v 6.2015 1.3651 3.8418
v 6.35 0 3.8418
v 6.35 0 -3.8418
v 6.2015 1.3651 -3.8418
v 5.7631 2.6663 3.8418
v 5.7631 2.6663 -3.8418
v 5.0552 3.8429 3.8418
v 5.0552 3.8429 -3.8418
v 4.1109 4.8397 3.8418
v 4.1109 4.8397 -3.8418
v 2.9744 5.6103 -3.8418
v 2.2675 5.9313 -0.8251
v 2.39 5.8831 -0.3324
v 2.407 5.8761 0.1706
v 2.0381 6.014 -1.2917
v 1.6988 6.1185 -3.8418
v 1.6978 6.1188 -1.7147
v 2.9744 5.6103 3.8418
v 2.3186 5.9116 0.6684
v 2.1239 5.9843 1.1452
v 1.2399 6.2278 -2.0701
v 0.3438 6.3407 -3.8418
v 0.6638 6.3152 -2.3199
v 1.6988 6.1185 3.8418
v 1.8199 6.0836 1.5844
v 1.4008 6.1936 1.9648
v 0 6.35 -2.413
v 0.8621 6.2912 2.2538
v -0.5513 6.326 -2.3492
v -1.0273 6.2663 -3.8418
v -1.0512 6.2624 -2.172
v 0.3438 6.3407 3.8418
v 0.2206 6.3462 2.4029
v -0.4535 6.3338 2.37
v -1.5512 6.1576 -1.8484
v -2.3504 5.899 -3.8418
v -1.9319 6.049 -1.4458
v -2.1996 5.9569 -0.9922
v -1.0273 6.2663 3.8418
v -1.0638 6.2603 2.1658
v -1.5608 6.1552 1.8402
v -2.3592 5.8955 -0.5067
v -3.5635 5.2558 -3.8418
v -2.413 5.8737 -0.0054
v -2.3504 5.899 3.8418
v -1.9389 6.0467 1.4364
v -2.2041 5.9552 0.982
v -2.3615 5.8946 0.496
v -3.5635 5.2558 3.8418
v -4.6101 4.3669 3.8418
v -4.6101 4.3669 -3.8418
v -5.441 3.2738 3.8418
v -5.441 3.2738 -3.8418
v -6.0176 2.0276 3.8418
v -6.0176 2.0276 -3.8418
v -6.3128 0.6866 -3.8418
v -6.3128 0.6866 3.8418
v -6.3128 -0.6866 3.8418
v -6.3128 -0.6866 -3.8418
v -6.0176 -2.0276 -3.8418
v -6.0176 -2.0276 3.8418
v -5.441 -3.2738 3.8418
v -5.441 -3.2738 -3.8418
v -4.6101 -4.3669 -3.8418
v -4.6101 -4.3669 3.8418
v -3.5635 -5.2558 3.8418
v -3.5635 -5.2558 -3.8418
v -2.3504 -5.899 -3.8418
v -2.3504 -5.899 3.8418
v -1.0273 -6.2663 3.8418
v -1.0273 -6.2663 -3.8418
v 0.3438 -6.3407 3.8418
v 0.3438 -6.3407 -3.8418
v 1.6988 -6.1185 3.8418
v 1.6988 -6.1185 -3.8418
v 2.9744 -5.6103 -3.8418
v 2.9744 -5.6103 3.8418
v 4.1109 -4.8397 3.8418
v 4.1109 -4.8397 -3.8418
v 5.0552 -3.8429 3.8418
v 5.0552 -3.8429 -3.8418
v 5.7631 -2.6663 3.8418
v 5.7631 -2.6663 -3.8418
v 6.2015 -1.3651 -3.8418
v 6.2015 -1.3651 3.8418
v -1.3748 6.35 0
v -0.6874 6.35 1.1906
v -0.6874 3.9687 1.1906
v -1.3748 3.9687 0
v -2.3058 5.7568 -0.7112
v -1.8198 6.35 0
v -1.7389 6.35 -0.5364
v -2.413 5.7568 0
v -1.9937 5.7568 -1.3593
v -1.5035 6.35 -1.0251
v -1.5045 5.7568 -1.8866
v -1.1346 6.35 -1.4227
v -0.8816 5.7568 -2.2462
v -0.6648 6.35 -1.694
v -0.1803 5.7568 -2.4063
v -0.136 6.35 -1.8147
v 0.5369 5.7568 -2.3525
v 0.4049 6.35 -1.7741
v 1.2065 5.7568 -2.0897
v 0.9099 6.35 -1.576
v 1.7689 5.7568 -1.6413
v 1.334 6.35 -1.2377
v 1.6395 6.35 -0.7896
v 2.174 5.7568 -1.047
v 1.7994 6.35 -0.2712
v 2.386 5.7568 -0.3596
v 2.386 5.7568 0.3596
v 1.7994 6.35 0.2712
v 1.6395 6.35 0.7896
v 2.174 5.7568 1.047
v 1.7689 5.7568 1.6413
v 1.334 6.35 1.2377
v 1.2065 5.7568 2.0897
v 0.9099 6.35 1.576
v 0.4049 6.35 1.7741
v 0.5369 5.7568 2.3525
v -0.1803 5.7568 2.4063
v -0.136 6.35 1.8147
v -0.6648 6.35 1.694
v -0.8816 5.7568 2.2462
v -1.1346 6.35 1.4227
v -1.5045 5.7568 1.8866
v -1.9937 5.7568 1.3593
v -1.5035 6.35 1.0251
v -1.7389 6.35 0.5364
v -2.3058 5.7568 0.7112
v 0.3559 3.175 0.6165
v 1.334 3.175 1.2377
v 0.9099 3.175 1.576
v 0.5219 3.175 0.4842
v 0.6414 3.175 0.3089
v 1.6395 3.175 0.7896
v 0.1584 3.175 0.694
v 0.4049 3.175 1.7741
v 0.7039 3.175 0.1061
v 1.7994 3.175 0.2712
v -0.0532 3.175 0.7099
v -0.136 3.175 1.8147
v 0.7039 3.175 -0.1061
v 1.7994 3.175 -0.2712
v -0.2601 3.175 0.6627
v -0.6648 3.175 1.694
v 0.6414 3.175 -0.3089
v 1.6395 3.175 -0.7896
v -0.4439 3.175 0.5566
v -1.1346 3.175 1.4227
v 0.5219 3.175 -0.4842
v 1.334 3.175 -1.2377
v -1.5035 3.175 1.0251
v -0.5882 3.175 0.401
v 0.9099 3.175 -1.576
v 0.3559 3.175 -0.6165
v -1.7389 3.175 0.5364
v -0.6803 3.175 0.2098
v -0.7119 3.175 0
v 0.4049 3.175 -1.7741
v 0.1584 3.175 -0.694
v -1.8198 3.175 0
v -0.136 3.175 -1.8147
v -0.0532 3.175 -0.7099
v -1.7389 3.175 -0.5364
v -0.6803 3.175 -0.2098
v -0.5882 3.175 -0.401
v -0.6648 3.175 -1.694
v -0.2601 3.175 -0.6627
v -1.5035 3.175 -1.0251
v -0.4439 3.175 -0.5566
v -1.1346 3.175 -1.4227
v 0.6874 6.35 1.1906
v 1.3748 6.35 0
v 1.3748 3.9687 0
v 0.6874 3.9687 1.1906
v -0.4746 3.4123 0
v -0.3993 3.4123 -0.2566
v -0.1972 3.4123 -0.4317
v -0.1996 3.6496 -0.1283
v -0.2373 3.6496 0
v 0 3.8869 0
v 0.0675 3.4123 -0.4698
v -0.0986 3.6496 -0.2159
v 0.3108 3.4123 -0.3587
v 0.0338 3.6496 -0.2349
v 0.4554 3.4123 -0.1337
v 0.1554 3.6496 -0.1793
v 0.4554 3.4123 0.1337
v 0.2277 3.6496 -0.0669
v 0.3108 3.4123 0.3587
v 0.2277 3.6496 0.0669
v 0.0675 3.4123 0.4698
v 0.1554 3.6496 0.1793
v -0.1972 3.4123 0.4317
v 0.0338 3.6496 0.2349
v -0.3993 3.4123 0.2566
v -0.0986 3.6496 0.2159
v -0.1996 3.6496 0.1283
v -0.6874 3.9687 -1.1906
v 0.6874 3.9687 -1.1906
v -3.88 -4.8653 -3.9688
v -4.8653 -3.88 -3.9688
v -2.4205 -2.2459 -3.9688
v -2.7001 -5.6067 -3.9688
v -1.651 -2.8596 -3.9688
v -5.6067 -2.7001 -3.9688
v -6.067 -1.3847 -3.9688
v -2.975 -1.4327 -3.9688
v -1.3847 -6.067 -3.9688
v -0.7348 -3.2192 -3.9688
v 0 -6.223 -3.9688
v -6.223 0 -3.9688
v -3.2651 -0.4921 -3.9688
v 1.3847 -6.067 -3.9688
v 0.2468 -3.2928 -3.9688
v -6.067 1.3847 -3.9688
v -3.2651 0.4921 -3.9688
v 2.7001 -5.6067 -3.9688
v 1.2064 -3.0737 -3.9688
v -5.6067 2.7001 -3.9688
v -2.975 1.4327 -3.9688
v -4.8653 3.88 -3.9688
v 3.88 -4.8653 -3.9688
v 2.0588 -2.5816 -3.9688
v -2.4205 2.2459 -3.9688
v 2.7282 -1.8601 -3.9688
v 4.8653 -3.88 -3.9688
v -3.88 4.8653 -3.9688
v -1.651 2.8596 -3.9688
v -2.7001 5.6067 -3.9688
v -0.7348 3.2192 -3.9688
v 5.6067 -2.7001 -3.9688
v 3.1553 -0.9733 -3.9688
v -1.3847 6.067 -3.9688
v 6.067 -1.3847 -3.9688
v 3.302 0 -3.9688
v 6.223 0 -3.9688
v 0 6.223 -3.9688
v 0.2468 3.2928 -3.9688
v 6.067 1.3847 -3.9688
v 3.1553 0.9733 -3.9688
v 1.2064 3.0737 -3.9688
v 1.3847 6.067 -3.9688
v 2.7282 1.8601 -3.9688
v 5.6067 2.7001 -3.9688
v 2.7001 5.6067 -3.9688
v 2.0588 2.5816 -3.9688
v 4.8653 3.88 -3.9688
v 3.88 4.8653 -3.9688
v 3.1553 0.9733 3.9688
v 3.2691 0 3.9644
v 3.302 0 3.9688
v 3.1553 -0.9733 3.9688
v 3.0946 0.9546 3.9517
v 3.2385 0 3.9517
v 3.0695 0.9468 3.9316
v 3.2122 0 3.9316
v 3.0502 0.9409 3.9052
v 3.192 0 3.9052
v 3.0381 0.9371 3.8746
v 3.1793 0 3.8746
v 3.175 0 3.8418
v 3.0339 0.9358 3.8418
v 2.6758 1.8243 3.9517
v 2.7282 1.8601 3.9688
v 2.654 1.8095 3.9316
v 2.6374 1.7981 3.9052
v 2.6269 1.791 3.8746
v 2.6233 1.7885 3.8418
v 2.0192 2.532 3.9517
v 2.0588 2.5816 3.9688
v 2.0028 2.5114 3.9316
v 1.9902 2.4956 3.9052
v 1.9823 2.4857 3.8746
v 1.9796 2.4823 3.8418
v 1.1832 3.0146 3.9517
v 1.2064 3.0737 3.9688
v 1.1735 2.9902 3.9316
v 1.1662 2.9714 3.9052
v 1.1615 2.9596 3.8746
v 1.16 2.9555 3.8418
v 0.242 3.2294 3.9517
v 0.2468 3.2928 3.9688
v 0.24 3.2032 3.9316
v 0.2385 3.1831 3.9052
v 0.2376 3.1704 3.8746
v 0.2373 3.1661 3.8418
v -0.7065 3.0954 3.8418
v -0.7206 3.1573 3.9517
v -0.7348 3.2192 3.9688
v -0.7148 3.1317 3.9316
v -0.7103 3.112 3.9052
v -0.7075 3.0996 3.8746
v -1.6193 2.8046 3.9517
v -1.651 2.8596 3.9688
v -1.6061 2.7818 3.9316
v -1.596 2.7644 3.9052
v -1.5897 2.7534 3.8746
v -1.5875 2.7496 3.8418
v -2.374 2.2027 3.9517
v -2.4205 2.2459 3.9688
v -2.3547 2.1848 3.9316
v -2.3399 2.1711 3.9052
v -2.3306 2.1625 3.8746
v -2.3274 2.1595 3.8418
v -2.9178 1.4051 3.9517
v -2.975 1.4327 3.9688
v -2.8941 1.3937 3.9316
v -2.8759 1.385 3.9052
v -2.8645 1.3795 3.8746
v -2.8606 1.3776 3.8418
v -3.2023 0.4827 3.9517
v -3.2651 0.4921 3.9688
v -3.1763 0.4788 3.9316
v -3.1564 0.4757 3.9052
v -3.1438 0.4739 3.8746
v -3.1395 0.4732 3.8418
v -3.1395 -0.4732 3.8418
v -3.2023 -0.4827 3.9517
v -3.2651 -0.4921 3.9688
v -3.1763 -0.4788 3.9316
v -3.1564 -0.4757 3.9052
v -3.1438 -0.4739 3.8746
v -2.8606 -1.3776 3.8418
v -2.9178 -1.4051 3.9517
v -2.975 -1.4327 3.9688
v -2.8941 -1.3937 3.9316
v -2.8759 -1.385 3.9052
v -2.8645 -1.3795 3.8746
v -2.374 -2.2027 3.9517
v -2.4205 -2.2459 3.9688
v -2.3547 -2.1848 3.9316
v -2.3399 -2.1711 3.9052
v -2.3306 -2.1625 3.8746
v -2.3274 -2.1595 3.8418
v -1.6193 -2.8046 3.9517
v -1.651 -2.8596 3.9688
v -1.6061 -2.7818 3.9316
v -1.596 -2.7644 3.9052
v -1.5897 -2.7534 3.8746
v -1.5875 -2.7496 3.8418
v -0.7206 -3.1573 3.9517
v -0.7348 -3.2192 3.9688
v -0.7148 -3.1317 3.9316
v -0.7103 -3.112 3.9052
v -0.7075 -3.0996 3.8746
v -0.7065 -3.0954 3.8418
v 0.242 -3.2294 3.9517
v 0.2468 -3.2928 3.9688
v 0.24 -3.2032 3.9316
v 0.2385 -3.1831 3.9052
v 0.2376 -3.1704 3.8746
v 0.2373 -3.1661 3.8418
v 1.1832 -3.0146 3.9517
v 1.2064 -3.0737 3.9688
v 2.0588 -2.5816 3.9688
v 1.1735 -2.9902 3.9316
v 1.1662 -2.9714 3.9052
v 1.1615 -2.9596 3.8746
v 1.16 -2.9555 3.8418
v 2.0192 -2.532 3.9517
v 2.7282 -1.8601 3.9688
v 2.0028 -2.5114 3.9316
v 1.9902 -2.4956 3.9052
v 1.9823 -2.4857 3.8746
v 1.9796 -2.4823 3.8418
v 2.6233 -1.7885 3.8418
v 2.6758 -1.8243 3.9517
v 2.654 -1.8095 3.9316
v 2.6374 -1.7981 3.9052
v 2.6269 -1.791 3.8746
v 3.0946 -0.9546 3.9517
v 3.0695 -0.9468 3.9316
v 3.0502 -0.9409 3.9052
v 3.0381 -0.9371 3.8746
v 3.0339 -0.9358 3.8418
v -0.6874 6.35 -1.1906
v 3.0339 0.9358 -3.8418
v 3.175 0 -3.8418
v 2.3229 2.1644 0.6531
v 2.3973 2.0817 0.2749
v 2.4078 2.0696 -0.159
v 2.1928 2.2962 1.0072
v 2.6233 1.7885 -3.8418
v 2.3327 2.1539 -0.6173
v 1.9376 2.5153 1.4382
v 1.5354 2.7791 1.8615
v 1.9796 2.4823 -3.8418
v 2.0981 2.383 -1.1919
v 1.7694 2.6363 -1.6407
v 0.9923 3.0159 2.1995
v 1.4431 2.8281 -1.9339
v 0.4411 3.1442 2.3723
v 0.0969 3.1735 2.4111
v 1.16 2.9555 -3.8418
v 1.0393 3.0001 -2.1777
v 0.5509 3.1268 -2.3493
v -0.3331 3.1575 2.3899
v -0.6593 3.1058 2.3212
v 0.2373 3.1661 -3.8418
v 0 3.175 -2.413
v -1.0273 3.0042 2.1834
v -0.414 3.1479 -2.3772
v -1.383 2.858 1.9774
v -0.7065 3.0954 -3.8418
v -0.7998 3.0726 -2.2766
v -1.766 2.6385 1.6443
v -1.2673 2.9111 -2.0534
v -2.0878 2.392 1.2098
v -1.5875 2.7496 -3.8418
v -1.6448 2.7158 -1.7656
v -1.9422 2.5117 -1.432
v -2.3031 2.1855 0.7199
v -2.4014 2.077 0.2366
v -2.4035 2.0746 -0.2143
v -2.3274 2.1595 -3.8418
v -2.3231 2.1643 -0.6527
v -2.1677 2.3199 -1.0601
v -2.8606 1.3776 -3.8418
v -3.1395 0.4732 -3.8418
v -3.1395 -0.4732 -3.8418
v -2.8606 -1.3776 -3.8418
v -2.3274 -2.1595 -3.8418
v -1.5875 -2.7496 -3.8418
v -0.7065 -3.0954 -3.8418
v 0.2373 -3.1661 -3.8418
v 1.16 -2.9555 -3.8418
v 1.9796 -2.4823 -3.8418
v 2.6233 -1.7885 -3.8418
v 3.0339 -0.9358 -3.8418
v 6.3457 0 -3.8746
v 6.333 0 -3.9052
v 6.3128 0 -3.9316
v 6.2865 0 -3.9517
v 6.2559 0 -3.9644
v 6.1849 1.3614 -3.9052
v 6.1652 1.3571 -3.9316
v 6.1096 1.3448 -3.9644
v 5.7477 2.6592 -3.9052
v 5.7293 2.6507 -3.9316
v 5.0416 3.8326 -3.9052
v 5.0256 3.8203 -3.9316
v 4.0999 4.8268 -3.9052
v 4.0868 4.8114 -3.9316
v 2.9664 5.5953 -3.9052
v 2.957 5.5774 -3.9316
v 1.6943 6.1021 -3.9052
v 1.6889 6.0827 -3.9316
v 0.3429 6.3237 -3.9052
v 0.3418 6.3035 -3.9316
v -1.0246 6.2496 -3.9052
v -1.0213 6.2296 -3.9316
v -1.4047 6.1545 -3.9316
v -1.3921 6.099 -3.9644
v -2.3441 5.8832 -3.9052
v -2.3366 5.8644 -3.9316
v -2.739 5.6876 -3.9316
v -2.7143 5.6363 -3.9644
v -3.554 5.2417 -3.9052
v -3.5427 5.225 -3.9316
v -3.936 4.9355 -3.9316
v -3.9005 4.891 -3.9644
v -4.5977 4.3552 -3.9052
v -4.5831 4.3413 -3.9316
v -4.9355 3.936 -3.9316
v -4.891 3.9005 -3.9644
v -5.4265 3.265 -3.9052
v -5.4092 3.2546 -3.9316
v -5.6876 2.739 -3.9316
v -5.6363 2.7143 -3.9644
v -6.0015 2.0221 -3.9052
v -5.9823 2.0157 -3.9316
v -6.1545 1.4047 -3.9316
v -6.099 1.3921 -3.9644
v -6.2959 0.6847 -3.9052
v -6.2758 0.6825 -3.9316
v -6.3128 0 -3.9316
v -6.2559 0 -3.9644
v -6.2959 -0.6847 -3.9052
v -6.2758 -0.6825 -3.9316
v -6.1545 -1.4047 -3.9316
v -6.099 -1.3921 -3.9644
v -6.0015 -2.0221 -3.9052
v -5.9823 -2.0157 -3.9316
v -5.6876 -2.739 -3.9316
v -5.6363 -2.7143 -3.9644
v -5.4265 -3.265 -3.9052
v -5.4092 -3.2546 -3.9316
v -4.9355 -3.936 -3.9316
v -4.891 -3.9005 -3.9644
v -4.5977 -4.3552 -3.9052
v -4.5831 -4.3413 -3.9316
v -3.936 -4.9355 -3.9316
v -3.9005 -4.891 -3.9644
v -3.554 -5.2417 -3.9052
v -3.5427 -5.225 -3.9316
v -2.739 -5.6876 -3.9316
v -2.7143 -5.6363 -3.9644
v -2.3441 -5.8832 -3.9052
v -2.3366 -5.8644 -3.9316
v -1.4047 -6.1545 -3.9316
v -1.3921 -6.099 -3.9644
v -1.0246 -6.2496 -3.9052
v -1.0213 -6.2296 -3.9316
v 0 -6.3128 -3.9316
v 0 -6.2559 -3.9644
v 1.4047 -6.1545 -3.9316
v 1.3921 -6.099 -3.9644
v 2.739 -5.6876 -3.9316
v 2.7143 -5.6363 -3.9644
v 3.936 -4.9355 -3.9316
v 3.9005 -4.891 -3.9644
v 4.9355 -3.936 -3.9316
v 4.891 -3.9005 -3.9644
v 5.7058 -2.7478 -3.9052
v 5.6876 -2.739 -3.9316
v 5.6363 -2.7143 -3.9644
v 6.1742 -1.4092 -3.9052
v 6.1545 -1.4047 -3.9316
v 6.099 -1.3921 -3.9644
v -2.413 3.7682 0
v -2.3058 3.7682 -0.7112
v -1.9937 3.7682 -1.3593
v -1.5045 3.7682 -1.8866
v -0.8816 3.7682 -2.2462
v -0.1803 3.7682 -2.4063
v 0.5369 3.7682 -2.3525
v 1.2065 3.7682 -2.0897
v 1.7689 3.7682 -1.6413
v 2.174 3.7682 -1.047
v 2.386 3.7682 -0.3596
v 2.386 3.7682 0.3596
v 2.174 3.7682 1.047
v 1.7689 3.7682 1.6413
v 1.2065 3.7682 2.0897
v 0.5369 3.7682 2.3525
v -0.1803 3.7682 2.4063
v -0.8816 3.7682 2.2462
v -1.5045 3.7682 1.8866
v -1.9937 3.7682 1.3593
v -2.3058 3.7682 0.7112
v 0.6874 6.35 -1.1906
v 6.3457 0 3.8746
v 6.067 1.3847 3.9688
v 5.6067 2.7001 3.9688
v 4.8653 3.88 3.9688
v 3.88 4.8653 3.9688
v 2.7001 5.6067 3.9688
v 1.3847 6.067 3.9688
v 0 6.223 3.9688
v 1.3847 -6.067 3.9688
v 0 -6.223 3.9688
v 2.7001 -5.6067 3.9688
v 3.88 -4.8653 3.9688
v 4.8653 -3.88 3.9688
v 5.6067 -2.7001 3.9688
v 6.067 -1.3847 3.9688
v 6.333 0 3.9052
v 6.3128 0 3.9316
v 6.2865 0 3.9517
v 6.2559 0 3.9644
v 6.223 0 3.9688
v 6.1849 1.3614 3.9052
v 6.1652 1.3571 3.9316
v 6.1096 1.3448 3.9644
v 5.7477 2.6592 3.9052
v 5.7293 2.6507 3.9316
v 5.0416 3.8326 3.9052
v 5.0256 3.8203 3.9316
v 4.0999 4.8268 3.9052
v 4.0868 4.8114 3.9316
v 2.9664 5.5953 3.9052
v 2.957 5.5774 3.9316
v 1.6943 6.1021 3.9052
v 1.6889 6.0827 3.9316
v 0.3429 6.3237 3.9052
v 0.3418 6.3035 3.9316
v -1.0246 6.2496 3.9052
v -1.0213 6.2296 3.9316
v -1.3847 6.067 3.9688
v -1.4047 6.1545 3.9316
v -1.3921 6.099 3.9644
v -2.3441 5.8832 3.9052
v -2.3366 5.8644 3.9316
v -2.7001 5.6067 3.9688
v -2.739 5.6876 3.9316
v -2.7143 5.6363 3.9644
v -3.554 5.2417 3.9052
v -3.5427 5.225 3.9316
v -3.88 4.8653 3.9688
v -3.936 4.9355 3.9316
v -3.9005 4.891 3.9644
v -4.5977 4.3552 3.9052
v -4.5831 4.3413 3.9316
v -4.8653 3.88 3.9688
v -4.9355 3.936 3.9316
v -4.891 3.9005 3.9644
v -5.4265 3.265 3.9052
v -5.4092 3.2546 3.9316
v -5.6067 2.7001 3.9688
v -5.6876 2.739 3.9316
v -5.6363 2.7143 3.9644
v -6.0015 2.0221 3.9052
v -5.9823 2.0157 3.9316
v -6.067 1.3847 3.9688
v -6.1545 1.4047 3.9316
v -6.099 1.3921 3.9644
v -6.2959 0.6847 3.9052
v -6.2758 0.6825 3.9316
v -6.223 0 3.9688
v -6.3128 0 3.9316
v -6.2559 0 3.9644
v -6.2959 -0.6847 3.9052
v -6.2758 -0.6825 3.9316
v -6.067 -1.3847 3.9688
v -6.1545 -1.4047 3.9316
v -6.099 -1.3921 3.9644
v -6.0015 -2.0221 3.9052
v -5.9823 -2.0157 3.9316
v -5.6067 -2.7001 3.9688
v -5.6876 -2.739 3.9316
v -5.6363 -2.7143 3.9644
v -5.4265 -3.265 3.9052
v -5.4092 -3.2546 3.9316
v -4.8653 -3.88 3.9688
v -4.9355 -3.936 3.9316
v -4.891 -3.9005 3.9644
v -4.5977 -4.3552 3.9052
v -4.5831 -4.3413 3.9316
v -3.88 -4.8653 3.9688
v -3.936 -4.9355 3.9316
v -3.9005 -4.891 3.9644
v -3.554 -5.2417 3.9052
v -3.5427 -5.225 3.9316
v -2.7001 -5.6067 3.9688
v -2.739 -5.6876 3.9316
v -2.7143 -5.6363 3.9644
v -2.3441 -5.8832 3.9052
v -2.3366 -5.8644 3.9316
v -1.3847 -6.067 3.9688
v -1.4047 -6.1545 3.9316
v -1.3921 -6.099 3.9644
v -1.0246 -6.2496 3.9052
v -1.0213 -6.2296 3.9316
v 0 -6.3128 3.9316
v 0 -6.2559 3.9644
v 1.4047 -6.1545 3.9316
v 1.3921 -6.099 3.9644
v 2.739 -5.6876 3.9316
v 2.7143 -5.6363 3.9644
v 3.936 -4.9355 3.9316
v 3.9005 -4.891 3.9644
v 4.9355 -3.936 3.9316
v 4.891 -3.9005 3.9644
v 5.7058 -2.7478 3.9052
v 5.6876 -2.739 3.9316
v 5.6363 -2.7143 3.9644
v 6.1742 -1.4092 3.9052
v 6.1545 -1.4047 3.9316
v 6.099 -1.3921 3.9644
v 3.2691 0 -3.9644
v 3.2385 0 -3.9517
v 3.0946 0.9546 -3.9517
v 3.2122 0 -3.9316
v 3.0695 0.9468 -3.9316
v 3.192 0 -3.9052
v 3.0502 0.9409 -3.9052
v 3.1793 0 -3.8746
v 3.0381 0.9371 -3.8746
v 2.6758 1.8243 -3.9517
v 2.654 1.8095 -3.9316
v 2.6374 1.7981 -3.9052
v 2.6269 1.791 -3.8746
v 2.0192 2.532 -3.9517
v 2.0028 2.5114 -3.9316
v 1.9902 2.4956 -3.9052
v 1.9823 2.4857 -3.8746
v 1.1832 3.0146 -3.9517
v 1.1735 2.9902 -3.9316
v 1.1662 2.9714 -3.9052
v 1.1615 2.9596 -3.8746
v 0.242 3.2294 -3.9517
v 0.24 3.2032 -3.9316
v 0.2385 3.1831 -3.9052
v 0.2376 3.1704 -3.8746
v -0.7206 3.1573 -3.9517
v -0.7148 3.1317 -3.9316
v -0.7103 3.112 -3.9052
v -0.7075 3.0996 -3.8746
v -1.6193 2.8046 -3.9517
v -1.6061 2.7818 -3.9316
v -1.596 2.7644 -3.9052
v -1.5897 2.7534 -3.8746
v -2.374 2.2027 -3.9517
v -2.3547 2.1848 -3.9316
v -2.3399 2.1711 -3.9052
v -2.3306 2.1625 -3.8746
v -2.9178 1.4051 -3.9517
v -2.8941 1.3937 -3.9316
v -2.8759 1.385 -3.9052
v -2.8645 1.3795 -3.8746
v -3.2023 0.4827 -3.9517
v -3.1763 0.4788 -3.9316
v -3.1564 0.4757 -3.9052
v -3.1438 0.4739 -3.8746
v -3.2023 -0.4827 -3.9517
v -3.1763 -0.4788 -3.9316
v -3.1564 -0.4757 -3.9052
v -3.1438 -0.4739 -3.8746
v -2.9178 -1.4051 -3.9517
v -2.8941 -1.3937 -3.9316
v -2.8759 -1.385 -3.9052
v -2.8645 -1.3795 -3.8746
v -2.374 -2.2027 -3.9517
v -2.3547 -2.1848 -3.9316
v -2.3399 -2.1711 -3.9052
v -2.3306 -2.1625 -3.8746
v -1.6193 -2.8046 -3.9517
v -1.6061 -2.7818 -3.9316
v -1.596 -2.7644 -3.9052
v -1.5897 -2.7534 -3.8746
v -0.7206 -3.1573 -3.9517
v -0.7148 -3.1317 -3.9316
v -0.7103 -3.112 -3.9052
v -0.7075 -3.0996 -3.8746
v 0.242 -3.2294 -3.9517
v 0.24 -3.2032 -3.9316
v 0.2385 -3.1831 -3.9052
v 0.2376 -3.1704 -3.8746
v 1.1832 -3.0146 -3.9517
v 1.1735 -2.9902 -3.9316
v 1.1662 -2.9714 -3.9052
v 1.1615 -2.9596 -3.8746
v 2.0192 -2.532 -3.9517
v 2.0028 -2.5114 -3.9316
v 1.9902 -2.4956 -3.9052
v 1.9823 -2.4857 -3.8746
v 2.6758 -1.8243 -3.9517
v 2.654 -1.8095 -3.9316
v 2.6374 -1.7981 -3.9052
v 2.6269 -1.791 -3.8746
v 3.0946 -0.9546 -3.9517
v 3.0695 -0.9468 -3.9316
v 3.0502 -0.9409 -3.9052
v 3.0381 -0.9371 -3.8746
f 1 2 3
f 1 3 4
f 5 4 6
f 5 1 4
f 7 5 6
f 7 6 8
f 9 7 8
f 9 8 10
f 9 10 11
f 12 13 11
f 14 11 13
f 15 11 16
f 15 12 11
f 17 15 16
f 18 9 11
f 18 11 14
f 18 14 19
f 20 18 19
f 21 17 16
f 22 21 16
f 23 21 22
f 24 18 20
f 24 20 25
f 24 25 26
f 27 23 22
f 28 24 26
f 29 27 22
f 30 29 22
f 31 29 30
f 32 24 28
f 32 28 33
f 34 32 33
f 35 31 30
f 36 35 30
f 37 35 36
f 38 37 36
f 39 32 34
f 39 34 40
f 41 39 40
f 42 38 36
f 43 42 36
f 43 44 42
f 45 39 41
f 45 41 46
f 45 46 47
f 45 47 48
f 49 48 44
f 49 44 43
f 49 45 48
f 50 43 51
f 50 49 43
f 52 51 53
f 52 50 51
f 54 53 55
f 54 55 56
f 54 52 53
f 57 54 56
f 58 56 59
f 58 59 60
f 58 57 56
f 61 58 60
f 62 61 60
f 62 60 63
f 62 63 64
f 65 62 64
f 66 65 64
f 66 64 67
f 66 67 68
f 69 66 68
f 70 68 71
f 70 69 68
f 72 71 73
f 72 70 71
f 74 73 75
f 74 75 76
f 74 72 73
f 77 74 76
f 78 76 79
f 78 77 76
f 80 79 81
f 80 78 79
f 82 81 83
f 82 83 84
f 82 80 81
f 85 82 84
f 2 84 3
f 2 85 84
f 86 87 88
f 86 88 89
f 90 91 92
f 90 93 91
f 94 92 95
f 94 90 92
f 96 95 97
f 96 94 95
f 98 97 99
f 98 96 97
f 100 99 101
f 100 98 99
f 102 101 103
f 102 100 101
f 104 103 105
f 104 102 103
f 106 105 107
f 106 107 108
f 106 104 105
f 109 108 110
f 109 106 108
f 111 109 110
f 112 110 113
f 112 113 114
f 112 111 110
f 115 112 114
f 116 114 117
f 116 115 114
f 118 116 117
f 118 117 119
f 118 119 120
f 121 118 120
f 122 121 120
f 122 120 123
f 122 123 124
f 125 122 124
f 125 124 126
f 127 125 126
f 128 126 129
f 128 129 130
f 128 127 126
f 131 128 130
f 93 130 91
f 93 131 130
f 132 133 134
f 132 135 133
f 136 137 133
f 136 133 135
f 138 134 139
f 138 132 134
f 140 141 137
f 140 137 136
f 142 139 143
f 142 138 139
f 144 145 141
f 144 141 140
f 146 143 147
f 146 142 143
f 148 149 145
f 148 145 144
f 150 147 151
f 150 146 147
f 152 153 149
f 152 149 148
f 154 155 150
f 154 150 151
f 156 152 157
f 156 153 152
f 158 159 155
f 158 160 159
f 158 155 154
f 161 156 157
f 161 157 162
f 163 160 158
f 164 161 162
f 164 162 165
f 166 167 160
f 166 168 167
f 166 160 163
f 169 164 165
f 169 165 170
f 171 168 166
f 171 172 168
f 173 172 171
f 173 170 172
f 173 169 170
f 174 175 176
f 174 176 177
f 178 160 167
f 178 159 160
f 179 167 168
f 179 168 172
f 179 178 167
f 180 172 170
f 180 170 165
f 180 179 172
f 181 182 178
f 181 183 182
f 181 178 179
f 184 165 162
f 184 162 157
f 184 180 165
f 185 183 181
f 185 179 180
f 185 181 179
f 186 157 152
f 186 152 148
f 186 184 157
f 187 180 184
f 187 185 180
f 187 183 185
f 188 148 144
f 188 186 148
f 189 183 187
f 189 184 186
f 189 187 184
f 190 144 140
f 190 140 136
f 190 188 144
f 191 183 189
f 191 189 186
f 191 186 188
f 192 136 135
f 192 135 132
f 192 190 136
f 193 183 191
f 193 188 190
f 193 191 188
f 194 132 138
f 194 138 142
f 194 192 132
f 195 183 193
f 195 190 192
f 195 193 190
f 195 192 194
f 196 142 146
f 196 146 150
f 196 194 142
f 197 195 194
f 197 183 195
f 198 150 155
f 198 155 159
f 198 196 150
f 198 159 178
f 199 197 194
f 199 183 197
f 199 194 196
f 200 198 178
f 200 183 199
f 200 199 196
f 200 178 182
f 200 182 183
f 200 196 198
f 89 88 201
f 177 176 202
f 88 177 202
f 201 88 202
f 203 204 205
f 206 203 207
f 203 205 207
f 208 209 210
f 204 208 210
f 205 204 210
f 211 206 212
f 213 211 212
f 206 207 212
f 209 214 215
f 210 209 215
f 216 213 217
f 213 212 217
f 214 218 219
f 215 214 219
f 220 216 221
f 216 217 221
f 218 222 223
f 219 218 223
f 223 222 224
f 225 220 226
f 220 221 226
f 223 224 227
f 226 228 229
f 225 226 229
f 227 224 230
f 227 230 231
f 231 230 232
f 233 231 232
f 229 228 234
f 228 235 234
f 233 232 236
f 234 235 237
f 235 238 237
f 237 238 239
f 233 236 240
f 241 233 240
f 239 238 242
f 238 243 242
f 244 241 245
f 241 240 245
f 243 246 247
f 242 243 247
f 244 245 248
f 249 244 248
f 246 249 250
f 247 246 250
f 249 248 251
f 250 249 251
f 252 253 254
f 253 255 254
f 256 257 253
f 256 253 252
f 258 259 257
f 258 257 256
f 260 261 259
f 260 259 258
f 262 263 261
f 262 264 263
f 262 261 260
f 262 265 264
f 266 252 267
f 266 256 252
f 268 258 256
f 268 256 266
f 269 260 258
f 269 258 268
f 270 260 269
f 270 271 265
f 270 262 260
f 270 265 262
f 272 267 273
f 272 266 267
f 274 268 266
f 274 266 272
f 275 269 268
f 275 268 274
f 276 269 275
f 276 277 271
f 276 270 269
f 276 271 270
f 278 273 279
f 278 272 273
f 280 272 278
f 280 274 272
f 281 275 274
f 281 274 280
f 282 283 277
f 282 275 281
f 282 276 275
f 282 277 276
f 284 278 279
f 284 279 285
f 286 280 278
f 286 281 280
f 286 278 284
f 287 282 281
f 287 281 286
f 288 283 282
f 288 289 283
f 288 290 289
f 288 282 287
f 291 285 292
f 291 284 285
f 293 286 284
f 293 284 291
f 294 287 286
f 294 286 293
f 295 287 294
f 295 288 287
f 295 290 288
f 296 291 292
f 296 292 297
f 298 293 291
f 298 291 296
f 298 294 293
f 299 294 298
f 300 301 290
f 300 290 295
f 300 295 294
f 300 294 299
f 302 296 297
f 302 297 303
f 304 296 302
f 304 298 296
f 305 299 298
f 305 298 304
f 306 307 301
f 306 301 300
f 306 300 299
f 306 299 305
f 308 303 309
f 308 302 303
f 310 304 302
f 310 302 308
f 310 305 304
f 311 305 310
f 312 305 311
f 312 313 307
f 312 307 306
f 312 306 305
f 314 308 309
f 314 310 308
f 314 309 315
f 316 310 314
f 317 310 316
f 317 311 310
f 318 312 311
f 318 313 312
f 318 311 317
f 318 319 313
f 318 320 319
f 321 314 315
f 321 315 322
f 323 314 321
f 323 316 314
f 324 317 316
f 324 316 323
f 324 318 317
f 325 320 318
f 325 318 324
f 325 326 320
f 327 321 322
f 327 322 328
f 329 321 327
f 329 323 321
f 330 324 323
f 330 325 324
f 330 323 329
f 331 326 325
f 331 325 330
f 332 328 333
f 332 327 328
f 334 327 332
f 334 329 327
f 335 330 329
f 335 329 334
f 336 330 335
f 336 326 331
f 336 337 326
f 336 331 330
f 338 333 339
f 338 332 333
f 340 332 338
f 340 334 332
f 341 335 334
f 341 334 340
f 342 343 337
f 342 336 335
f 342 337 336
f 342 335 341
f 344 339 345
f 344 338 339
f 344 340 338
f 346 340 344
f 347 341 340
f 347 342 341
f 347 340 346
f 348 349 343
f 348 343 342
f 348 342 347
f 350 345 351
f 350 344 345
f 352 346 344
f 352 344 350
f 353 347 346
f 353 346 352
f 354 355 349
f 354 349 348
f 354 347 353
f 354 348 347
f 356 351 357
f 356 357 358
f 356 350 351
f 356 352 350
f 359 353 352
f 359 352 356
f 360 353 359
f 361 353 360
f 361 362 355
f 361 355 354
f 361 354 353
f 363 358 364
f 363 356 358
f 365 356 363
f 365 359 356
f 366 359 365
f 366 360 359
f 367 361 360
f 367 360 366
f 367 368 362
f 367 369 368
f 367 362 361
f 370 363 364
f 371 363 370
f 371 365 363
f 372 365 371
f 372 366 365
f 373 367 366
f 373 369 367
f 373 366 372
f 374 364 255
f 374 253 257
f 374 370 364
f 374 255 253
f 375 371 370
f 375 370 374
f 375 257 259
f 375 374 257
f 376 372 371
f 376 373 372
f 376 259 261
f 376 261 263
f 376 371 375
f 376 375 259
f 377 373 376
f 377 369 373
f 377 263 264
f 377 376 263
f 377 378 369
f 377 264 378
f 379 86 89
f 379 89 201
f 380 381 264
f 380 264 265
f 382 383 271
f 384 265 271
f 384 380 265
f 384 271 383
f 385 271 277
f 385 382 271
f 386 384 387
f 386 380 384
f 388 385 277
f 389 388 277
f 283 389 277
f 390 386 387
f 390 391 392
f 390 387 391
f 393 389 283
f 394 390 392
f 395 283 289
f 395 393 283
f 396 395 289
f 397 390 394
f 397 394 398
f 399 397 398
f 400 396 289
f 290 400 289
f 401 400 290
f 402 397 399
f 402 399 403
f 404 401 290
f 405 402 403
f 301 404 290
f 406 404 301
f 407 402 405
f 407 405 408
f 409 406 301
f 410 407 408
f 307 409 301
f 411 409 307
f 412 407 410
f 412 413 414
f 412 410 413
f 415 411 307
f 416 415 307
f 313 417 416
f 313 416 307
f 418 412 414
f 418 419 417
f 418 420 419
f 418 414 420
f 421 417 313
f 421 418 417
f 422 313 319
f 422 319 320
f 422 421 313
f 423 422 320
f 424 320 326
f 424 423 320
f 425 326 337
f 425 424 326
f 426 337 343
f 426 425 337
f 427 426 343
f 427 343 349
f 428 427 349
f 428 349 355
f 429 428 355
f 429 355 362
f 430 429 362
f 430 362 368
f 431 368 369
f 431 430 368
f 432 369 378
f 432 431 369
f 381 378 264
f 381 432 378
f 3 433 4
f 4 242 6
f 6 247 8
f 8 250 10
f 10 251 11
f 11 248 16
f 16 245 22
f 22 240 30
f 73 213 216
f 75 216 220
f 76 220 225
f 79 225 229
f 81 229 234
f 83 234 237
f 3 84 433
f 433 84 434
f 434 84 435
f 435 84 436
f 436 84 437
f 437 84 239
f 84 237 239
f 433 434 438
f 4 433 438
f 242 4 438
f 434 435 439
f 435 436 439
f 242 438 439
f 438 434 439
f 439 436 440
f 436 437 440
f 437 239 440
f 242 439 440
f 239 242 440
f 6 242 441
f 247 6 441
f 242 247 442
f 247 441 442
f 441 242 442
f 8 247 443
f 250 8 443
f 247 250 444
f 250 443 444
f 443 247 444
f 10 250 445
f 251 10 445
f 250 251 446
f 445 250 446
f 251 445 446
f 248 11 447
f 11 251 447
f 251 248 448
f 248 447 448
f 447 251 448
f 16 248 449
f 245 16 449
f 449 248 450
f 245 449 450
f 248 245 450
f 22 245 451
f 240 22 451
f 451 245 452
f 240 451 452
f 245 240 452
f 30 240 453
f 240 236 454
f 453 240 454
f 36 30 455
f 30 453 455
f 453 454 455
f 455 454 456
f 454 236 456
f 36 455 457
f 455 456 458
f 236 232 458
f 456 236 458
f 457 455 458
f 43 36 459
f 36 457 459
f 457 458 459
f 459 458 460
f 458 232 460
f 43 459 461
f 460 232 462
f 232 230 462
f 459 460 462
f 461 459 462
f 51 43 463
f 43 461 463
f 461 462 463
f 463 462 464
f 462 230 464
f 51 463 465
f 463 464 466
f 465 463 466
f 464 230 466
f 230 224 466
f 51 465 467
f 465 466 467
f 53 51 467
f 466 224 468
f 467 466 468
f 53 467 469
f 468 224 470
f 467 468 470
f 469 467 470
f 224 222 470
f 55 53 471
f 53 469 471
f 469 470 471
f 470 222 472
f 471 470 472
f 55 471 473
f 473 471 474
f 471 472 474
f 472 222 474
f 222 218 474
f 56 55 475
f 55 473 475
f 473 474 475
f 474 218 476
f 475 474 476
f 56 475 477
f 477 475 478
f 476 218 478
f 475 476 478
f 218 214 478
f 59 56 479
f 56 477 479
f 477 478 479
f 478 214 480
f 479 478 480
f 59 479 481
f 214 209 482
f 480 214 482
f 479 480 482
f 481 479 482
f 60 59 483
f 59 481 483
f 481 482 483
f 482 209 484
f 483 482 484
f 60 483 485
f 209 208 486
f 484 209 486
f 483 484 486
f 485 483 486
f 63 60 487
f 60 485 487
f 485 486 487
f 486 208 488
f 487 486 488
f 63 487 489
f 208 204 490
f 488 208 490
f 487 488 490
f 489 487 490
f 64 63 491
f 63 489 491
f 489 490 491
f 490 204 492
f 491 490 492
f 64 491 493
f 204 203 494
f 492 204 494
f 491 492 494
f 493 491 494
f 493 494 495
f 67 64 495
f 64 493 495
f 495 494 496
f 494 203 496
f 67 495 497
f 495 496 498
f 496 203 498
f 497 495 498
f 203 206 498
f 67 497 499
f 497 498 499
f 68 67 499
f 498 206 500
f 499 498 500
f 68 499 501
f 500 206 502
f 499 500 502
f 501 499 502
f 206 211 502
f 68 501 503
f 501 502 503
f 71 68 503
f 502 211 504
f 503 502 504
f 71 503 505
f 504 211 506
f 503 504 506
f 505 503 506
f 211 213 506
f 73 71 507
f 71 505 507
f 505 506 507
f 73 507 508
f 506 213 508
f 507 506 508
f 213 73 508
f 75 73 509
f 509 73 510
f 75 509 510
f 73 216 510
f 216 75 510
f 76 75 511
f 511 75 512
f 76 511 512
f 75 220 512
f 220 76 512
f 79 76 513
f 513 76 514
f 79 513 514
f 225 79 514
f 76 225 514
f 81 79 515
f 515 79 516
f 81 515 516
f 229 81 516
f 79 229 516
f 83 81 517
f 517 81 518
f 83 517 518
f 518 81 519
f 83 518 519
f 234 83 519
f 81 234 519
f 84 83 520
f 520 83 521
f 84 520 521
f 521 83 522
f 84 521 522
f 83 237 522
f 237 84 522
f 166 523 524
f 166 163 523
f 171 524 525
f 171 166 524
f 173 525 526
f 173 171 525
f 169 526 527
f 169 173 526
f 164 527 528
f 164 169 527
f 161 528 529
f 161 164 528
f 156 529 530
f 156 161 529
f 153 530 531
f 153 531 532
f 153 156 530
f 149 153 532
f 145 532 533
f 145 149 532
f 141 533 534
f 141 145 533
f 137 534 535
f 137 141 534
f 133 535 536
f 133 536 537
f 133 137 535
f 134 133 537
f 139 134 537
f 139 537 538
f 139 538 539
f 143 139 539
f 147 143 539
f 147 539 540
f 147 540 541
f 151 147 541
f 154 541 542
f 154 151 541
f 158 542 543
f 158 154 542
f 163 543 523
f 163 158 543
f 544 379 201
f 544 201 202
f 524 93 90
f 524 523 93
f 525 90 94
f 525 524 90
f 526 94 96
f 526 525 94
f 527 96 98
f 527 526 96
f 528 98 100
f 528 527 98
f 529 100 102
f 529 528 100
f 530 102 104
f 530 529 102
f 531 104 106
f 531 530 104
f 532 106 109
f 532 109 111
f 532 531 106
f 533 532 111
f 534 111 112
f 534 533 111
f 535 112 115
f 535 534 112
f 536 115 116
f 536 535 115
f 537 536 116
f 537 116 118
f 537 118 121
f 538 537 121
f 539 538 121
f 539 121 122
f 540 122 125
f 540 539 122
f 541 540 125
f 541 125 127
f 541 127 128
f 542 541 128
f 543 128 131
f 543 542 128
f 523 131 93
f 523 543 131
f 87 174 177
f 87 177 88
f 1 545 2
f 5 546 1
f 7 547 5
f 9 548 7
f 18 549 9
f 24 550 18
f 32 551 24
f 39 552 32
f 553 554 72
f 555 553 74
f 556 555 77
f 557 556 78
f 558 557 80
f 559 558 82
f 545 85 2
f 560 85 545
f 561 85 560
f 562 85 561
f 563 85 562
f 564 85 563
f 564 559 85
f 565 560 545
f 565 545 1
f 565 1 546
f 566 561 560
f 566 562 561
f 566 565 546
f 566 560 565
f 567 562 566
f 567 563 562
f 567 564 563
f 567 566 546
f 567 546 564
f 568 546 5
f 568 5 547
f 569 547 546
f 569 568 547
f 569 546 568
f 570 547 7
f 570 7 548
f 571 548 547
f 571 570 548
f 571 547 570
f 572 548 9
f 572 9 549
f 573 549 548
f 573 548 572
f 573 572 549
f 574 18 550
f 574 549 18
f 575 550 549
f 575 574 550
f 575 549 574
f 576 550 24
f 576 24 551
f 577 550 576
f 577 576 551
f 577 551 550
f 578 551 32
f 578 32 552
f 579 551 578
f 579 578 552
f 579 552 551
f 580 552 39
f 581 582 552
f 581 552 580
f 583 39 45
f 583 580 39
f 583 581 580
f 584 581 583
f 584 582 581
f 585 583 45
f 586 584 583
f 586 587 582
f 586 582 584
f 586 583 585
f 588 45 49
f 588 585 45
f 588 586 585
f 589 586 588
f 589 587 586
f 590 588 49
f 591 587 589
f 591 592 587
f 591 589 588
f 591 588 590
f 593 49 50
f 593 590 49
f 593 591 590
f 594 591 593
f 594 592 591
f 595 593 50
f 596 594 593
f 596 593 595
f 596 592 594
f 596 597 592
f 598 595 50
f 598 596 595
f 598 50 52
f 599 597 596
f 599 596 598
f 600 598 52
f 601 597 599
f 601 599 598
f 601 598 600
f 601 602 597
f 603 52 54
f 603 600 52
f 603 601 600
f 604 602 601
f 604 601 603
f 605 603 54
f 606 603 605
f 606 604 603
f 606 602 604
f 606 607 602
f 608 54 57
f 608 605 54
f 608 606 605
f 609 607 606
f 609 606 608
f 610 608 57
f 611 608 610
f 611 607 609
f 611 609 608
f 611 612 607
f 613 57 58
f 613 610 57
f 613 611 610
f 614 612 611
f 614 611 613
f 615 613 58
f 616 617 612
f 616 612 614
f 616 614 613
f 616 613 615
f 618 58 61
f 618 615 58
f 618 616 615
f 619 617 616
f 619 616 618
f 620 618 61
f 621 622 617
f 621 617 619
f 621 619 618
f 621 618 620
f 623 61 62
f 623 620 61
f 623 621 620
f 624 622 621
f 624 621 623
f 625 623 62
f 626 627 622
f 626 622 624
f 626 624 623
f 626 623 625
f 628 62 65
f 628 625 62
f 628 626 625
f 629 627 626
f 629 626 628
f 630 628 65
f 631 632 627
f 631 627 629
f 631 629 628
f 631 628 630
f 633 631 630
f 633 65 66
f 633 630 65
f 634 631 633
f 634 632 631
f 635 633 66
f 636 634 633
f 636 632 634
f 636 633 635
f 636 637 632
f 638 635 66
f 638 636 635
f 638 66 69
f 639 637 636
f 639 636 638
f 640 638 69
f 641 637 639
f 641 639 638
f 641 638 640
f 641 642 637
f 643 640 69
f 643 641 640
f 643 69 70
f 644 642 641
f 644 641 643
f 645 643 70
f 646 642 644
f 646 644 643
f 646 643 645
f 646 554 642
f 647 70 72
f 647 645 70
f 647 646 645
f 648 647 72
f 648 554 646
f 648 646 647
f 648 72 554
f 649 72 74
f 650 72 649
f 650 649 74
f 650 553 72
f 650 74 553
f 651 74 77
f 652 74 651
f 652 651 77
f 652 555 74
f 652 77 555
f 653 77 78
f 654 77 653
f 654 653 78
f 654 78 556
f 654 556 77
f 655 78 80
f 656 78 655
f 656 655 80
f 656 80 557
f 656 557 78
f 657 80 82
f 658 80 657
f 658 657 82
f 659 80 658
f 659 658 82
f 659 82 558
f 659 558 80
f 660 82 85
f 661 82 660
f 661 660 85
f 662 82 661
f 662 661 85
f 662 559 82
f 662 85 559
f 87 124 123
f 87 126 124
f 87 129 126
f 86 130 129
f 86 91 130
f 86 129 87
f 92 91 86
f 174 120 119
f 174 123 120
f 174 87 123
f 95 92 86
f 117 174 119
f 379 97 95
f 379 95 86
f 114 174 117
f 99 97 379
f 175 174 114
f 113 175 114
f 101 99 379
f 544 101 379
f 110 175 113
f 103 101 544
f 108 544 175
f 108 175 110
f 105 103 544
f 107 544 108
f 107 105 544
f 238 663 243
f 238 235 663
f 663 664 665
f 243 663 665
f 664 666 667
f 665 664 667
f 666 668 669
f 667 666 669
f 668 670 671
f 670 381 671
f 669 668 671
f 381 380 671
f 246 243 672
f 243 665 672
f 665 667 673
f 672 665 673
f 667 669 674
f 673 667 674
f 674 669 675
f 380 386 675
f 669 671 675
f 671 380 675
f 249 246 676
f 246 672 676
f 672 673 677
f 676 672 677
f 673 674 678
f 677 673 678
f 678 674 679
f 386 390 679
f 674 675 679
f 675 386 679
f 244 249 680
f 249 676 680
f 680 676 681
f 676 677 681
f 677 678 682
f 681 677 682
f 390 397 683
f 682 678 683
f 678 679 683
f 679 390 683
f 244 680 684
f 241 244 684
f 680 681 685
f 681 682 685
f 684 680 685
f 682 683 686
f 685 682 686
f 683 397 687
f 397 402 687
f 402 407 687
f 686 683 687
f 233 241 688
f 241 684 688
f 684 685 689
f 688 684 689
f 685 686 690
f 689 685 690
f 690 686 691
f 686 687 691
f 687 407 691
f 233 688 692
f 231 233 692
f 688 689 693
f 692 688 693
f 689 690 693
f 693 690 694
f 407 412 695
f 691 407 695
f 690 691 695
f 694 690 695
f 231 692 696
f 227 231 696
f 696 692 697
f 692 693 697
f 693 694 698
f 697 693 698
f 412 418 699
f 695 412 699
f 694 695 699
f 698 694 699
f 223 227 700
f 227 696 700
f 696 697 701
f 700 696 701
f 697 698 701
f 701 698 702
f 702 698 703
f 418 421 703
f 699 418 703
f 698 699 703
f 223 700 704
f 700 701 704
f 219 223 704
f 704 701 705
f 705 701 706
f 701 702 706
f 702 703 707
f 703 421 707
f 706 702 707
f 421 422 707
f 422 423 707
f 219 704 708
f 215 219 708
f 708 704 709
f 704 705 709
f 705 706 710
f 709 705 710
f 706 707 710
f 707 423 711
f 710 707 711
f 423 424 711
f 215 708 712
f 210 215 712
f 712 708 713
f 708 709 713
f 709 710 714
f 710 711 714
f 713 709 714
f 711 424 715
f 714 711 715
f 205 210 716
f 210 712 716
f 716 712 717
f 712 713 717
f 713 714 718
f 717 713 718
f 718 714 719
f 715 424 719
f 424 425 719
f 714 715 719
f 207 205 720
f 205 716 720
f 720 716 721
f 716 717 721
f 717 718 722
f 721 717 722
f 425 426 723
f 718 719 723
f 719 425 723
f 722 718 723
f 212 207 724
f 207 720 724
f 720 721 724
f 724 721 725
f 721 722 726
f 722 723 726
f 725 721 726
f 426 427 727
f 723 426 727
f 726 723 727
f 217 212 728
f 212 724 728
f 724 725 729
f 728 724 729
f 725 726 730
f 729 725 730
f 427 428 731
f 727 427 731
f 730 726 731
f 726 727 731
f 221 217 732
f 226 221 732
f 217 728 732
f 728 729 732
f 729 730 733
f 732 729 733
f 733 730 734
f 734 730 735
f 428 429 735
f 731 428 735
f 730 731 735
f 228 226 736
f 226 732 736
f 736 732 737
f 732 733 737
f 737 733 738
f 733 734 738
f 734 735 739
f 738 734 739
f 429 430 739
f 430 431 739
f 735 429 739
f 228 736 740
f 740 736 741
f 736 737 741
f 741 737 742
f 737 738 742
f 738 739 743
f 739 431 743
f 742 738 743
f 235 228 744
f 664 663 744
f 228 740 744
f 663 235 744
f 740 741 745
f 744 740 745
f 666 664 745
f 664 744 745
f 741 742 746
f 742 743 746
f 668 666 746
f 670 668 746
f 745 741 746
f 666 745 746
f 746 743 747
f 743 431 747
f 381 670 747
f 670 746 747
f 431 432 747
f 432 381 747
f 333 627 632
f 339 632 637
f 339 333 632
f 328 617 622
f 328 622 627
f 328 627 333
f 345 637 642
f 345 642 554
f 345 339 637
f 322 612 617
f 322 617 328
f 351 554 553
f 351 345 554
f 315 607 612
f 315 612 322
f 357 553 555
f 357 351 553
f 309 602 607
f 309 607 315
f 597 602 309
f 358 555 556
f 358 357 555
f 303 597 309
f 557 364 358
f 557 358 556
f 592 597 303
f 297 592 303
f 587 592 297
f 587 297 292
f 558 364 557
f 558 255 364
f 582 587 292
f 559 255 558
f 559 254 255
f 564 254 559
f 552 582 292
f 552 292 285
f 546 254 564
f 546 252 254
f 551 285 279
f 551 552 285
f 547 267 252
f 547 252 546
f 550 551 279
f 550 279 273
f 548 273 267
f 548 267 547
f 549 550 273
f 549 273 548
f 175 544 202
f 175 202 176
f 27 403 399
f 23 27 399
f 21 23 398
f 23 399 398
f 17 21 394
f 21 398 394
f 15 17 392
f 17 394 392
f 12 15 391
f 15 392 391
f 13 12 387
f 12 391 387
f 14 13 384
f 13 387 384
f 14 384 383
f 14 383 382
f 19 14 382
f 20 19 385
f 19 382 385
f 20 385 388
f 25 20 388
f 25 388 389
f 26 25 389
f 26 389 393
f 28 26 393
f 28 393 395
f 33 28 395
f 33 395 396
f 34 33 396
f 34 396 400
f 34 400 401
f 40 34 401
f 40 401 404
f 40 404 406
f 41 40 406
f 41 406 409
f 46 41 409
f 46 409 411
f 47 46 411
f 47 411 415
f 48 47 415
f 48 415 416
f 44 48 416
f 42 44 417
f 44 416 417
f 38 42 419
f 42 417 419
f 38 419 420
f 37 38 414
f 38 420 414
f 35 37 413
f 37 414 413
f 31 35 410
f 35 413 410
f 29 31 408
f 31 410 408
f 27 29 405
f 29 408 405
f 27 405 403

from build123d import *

# Parameters (mm, degrees)
SKETCH1_R          = 6.35
SKETCH1_R_2        = 3.175
EXTRUDE1_DEPTH     = 3.96875
SKETCH2_R          = 2.413
CUT_EXTRUDE1_DEPTH = 7.35
FILLET1_R          = 0.127
CUT_EXTRUDE2_DEPTH = 2.38125


with BuildPart() as part:
    # Sketch1 → Extrude1 (new body, symmetric)
    with BuildSketch(Plane.XY):
        Circle(SKETCH1_R)
        Circle(SKETCH1_R_2, mode=Mode.SUBTRACT)
    extrude(amount=EXTRUDE1_DEPTH, both=True)

    # Sketch2 → Cut-Extrude1 (cut, through all)
    with BuildSketch(Plane(origin=(41.275, 0, 0), x_dir=(0, 0, -1), z_dir=(0, -1, 0))):
        with Locations((0, -41.275)):
            Circle(SKETCH2_R)
    extrude(amount=-CUT_EXTRUDE1_DEPTH, mode=Mode.SUBTRACT)

    # Fillet1
    fillet1_edges = [part.edges().sort_by_distance(p)[0] for p in [
        (-6.35, 0, -3.96875),
        (-6.35, 0, 3.96875),
        (-3.175, 0, -3.96875),
        (-3.175, 0, 3.96875),
    ]]
    fillet(fillet1_edges, radius=FILLET1_R)


with BuildPart() as body_2:
    # Sketch3 → Revolve1 (revolve)
    with BuildSketch(Plane.XY):
        Polygon((-1.819751616, 3.175), (-0.71189806, 3.175), (0, 3.88689806), (0, 6.35), (-1.819751616, 6.35), (-2.413, 5.756751616), (-2.413, 3.768248384), align=None)
    revolve(axis=Axis((0, 3.175, 0), (0, -1, 0)))

    # Sketch4 → Cut-Extrude2 (cut)
    with BuildSketch(Plane(origin=(3.3734375, 6.35, 0), x_dir=(0, 0, -1), z_dir=(0, -1, 0))):
        Polygon((0, -1.998622171), (-1.190625, -2.686029836), (-1.190625, -4.060845164), (0, -4.748252829), (1.190625, -4.060845164), (1.190625, -2.686029836), align=None)
    extrude(amount=CUT_EXTRUDE2_DEPTH, mode=Mode.SUBTRACT)


solid = Compound([part.part, body_2.part])
